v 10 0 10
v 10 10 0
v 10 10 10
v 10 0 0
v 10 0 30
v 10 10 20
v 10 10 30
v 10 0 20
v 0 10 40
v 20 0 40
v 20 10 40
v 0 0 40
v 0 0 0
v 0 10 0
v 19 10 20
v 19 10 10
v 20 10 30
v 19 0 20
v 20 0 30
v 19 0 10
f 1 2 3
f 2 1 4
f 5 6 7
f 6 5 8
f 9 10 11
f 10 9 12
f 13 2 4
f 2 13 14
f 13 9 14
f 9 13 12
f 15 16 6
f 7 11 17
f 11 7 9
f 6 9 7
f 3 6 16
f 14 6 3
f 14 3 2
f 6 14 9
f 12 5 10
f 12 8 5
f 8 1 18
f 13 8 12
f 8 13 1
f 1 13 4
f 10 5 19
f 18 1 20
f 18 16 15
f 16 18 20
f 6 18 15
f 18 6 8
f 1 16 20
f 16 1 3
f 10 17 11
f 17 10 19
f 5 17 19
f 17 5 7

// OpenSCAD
//The lower bar is shorter.
lower_shorter = 1;

cube([10, 10, 40]);
translate([0, 0, 10]) {
	cube([20 - lower_shorter, 10, 10]);
}
translate([0, 0, 30]) {
	cube([20, 10, 10]);
}
